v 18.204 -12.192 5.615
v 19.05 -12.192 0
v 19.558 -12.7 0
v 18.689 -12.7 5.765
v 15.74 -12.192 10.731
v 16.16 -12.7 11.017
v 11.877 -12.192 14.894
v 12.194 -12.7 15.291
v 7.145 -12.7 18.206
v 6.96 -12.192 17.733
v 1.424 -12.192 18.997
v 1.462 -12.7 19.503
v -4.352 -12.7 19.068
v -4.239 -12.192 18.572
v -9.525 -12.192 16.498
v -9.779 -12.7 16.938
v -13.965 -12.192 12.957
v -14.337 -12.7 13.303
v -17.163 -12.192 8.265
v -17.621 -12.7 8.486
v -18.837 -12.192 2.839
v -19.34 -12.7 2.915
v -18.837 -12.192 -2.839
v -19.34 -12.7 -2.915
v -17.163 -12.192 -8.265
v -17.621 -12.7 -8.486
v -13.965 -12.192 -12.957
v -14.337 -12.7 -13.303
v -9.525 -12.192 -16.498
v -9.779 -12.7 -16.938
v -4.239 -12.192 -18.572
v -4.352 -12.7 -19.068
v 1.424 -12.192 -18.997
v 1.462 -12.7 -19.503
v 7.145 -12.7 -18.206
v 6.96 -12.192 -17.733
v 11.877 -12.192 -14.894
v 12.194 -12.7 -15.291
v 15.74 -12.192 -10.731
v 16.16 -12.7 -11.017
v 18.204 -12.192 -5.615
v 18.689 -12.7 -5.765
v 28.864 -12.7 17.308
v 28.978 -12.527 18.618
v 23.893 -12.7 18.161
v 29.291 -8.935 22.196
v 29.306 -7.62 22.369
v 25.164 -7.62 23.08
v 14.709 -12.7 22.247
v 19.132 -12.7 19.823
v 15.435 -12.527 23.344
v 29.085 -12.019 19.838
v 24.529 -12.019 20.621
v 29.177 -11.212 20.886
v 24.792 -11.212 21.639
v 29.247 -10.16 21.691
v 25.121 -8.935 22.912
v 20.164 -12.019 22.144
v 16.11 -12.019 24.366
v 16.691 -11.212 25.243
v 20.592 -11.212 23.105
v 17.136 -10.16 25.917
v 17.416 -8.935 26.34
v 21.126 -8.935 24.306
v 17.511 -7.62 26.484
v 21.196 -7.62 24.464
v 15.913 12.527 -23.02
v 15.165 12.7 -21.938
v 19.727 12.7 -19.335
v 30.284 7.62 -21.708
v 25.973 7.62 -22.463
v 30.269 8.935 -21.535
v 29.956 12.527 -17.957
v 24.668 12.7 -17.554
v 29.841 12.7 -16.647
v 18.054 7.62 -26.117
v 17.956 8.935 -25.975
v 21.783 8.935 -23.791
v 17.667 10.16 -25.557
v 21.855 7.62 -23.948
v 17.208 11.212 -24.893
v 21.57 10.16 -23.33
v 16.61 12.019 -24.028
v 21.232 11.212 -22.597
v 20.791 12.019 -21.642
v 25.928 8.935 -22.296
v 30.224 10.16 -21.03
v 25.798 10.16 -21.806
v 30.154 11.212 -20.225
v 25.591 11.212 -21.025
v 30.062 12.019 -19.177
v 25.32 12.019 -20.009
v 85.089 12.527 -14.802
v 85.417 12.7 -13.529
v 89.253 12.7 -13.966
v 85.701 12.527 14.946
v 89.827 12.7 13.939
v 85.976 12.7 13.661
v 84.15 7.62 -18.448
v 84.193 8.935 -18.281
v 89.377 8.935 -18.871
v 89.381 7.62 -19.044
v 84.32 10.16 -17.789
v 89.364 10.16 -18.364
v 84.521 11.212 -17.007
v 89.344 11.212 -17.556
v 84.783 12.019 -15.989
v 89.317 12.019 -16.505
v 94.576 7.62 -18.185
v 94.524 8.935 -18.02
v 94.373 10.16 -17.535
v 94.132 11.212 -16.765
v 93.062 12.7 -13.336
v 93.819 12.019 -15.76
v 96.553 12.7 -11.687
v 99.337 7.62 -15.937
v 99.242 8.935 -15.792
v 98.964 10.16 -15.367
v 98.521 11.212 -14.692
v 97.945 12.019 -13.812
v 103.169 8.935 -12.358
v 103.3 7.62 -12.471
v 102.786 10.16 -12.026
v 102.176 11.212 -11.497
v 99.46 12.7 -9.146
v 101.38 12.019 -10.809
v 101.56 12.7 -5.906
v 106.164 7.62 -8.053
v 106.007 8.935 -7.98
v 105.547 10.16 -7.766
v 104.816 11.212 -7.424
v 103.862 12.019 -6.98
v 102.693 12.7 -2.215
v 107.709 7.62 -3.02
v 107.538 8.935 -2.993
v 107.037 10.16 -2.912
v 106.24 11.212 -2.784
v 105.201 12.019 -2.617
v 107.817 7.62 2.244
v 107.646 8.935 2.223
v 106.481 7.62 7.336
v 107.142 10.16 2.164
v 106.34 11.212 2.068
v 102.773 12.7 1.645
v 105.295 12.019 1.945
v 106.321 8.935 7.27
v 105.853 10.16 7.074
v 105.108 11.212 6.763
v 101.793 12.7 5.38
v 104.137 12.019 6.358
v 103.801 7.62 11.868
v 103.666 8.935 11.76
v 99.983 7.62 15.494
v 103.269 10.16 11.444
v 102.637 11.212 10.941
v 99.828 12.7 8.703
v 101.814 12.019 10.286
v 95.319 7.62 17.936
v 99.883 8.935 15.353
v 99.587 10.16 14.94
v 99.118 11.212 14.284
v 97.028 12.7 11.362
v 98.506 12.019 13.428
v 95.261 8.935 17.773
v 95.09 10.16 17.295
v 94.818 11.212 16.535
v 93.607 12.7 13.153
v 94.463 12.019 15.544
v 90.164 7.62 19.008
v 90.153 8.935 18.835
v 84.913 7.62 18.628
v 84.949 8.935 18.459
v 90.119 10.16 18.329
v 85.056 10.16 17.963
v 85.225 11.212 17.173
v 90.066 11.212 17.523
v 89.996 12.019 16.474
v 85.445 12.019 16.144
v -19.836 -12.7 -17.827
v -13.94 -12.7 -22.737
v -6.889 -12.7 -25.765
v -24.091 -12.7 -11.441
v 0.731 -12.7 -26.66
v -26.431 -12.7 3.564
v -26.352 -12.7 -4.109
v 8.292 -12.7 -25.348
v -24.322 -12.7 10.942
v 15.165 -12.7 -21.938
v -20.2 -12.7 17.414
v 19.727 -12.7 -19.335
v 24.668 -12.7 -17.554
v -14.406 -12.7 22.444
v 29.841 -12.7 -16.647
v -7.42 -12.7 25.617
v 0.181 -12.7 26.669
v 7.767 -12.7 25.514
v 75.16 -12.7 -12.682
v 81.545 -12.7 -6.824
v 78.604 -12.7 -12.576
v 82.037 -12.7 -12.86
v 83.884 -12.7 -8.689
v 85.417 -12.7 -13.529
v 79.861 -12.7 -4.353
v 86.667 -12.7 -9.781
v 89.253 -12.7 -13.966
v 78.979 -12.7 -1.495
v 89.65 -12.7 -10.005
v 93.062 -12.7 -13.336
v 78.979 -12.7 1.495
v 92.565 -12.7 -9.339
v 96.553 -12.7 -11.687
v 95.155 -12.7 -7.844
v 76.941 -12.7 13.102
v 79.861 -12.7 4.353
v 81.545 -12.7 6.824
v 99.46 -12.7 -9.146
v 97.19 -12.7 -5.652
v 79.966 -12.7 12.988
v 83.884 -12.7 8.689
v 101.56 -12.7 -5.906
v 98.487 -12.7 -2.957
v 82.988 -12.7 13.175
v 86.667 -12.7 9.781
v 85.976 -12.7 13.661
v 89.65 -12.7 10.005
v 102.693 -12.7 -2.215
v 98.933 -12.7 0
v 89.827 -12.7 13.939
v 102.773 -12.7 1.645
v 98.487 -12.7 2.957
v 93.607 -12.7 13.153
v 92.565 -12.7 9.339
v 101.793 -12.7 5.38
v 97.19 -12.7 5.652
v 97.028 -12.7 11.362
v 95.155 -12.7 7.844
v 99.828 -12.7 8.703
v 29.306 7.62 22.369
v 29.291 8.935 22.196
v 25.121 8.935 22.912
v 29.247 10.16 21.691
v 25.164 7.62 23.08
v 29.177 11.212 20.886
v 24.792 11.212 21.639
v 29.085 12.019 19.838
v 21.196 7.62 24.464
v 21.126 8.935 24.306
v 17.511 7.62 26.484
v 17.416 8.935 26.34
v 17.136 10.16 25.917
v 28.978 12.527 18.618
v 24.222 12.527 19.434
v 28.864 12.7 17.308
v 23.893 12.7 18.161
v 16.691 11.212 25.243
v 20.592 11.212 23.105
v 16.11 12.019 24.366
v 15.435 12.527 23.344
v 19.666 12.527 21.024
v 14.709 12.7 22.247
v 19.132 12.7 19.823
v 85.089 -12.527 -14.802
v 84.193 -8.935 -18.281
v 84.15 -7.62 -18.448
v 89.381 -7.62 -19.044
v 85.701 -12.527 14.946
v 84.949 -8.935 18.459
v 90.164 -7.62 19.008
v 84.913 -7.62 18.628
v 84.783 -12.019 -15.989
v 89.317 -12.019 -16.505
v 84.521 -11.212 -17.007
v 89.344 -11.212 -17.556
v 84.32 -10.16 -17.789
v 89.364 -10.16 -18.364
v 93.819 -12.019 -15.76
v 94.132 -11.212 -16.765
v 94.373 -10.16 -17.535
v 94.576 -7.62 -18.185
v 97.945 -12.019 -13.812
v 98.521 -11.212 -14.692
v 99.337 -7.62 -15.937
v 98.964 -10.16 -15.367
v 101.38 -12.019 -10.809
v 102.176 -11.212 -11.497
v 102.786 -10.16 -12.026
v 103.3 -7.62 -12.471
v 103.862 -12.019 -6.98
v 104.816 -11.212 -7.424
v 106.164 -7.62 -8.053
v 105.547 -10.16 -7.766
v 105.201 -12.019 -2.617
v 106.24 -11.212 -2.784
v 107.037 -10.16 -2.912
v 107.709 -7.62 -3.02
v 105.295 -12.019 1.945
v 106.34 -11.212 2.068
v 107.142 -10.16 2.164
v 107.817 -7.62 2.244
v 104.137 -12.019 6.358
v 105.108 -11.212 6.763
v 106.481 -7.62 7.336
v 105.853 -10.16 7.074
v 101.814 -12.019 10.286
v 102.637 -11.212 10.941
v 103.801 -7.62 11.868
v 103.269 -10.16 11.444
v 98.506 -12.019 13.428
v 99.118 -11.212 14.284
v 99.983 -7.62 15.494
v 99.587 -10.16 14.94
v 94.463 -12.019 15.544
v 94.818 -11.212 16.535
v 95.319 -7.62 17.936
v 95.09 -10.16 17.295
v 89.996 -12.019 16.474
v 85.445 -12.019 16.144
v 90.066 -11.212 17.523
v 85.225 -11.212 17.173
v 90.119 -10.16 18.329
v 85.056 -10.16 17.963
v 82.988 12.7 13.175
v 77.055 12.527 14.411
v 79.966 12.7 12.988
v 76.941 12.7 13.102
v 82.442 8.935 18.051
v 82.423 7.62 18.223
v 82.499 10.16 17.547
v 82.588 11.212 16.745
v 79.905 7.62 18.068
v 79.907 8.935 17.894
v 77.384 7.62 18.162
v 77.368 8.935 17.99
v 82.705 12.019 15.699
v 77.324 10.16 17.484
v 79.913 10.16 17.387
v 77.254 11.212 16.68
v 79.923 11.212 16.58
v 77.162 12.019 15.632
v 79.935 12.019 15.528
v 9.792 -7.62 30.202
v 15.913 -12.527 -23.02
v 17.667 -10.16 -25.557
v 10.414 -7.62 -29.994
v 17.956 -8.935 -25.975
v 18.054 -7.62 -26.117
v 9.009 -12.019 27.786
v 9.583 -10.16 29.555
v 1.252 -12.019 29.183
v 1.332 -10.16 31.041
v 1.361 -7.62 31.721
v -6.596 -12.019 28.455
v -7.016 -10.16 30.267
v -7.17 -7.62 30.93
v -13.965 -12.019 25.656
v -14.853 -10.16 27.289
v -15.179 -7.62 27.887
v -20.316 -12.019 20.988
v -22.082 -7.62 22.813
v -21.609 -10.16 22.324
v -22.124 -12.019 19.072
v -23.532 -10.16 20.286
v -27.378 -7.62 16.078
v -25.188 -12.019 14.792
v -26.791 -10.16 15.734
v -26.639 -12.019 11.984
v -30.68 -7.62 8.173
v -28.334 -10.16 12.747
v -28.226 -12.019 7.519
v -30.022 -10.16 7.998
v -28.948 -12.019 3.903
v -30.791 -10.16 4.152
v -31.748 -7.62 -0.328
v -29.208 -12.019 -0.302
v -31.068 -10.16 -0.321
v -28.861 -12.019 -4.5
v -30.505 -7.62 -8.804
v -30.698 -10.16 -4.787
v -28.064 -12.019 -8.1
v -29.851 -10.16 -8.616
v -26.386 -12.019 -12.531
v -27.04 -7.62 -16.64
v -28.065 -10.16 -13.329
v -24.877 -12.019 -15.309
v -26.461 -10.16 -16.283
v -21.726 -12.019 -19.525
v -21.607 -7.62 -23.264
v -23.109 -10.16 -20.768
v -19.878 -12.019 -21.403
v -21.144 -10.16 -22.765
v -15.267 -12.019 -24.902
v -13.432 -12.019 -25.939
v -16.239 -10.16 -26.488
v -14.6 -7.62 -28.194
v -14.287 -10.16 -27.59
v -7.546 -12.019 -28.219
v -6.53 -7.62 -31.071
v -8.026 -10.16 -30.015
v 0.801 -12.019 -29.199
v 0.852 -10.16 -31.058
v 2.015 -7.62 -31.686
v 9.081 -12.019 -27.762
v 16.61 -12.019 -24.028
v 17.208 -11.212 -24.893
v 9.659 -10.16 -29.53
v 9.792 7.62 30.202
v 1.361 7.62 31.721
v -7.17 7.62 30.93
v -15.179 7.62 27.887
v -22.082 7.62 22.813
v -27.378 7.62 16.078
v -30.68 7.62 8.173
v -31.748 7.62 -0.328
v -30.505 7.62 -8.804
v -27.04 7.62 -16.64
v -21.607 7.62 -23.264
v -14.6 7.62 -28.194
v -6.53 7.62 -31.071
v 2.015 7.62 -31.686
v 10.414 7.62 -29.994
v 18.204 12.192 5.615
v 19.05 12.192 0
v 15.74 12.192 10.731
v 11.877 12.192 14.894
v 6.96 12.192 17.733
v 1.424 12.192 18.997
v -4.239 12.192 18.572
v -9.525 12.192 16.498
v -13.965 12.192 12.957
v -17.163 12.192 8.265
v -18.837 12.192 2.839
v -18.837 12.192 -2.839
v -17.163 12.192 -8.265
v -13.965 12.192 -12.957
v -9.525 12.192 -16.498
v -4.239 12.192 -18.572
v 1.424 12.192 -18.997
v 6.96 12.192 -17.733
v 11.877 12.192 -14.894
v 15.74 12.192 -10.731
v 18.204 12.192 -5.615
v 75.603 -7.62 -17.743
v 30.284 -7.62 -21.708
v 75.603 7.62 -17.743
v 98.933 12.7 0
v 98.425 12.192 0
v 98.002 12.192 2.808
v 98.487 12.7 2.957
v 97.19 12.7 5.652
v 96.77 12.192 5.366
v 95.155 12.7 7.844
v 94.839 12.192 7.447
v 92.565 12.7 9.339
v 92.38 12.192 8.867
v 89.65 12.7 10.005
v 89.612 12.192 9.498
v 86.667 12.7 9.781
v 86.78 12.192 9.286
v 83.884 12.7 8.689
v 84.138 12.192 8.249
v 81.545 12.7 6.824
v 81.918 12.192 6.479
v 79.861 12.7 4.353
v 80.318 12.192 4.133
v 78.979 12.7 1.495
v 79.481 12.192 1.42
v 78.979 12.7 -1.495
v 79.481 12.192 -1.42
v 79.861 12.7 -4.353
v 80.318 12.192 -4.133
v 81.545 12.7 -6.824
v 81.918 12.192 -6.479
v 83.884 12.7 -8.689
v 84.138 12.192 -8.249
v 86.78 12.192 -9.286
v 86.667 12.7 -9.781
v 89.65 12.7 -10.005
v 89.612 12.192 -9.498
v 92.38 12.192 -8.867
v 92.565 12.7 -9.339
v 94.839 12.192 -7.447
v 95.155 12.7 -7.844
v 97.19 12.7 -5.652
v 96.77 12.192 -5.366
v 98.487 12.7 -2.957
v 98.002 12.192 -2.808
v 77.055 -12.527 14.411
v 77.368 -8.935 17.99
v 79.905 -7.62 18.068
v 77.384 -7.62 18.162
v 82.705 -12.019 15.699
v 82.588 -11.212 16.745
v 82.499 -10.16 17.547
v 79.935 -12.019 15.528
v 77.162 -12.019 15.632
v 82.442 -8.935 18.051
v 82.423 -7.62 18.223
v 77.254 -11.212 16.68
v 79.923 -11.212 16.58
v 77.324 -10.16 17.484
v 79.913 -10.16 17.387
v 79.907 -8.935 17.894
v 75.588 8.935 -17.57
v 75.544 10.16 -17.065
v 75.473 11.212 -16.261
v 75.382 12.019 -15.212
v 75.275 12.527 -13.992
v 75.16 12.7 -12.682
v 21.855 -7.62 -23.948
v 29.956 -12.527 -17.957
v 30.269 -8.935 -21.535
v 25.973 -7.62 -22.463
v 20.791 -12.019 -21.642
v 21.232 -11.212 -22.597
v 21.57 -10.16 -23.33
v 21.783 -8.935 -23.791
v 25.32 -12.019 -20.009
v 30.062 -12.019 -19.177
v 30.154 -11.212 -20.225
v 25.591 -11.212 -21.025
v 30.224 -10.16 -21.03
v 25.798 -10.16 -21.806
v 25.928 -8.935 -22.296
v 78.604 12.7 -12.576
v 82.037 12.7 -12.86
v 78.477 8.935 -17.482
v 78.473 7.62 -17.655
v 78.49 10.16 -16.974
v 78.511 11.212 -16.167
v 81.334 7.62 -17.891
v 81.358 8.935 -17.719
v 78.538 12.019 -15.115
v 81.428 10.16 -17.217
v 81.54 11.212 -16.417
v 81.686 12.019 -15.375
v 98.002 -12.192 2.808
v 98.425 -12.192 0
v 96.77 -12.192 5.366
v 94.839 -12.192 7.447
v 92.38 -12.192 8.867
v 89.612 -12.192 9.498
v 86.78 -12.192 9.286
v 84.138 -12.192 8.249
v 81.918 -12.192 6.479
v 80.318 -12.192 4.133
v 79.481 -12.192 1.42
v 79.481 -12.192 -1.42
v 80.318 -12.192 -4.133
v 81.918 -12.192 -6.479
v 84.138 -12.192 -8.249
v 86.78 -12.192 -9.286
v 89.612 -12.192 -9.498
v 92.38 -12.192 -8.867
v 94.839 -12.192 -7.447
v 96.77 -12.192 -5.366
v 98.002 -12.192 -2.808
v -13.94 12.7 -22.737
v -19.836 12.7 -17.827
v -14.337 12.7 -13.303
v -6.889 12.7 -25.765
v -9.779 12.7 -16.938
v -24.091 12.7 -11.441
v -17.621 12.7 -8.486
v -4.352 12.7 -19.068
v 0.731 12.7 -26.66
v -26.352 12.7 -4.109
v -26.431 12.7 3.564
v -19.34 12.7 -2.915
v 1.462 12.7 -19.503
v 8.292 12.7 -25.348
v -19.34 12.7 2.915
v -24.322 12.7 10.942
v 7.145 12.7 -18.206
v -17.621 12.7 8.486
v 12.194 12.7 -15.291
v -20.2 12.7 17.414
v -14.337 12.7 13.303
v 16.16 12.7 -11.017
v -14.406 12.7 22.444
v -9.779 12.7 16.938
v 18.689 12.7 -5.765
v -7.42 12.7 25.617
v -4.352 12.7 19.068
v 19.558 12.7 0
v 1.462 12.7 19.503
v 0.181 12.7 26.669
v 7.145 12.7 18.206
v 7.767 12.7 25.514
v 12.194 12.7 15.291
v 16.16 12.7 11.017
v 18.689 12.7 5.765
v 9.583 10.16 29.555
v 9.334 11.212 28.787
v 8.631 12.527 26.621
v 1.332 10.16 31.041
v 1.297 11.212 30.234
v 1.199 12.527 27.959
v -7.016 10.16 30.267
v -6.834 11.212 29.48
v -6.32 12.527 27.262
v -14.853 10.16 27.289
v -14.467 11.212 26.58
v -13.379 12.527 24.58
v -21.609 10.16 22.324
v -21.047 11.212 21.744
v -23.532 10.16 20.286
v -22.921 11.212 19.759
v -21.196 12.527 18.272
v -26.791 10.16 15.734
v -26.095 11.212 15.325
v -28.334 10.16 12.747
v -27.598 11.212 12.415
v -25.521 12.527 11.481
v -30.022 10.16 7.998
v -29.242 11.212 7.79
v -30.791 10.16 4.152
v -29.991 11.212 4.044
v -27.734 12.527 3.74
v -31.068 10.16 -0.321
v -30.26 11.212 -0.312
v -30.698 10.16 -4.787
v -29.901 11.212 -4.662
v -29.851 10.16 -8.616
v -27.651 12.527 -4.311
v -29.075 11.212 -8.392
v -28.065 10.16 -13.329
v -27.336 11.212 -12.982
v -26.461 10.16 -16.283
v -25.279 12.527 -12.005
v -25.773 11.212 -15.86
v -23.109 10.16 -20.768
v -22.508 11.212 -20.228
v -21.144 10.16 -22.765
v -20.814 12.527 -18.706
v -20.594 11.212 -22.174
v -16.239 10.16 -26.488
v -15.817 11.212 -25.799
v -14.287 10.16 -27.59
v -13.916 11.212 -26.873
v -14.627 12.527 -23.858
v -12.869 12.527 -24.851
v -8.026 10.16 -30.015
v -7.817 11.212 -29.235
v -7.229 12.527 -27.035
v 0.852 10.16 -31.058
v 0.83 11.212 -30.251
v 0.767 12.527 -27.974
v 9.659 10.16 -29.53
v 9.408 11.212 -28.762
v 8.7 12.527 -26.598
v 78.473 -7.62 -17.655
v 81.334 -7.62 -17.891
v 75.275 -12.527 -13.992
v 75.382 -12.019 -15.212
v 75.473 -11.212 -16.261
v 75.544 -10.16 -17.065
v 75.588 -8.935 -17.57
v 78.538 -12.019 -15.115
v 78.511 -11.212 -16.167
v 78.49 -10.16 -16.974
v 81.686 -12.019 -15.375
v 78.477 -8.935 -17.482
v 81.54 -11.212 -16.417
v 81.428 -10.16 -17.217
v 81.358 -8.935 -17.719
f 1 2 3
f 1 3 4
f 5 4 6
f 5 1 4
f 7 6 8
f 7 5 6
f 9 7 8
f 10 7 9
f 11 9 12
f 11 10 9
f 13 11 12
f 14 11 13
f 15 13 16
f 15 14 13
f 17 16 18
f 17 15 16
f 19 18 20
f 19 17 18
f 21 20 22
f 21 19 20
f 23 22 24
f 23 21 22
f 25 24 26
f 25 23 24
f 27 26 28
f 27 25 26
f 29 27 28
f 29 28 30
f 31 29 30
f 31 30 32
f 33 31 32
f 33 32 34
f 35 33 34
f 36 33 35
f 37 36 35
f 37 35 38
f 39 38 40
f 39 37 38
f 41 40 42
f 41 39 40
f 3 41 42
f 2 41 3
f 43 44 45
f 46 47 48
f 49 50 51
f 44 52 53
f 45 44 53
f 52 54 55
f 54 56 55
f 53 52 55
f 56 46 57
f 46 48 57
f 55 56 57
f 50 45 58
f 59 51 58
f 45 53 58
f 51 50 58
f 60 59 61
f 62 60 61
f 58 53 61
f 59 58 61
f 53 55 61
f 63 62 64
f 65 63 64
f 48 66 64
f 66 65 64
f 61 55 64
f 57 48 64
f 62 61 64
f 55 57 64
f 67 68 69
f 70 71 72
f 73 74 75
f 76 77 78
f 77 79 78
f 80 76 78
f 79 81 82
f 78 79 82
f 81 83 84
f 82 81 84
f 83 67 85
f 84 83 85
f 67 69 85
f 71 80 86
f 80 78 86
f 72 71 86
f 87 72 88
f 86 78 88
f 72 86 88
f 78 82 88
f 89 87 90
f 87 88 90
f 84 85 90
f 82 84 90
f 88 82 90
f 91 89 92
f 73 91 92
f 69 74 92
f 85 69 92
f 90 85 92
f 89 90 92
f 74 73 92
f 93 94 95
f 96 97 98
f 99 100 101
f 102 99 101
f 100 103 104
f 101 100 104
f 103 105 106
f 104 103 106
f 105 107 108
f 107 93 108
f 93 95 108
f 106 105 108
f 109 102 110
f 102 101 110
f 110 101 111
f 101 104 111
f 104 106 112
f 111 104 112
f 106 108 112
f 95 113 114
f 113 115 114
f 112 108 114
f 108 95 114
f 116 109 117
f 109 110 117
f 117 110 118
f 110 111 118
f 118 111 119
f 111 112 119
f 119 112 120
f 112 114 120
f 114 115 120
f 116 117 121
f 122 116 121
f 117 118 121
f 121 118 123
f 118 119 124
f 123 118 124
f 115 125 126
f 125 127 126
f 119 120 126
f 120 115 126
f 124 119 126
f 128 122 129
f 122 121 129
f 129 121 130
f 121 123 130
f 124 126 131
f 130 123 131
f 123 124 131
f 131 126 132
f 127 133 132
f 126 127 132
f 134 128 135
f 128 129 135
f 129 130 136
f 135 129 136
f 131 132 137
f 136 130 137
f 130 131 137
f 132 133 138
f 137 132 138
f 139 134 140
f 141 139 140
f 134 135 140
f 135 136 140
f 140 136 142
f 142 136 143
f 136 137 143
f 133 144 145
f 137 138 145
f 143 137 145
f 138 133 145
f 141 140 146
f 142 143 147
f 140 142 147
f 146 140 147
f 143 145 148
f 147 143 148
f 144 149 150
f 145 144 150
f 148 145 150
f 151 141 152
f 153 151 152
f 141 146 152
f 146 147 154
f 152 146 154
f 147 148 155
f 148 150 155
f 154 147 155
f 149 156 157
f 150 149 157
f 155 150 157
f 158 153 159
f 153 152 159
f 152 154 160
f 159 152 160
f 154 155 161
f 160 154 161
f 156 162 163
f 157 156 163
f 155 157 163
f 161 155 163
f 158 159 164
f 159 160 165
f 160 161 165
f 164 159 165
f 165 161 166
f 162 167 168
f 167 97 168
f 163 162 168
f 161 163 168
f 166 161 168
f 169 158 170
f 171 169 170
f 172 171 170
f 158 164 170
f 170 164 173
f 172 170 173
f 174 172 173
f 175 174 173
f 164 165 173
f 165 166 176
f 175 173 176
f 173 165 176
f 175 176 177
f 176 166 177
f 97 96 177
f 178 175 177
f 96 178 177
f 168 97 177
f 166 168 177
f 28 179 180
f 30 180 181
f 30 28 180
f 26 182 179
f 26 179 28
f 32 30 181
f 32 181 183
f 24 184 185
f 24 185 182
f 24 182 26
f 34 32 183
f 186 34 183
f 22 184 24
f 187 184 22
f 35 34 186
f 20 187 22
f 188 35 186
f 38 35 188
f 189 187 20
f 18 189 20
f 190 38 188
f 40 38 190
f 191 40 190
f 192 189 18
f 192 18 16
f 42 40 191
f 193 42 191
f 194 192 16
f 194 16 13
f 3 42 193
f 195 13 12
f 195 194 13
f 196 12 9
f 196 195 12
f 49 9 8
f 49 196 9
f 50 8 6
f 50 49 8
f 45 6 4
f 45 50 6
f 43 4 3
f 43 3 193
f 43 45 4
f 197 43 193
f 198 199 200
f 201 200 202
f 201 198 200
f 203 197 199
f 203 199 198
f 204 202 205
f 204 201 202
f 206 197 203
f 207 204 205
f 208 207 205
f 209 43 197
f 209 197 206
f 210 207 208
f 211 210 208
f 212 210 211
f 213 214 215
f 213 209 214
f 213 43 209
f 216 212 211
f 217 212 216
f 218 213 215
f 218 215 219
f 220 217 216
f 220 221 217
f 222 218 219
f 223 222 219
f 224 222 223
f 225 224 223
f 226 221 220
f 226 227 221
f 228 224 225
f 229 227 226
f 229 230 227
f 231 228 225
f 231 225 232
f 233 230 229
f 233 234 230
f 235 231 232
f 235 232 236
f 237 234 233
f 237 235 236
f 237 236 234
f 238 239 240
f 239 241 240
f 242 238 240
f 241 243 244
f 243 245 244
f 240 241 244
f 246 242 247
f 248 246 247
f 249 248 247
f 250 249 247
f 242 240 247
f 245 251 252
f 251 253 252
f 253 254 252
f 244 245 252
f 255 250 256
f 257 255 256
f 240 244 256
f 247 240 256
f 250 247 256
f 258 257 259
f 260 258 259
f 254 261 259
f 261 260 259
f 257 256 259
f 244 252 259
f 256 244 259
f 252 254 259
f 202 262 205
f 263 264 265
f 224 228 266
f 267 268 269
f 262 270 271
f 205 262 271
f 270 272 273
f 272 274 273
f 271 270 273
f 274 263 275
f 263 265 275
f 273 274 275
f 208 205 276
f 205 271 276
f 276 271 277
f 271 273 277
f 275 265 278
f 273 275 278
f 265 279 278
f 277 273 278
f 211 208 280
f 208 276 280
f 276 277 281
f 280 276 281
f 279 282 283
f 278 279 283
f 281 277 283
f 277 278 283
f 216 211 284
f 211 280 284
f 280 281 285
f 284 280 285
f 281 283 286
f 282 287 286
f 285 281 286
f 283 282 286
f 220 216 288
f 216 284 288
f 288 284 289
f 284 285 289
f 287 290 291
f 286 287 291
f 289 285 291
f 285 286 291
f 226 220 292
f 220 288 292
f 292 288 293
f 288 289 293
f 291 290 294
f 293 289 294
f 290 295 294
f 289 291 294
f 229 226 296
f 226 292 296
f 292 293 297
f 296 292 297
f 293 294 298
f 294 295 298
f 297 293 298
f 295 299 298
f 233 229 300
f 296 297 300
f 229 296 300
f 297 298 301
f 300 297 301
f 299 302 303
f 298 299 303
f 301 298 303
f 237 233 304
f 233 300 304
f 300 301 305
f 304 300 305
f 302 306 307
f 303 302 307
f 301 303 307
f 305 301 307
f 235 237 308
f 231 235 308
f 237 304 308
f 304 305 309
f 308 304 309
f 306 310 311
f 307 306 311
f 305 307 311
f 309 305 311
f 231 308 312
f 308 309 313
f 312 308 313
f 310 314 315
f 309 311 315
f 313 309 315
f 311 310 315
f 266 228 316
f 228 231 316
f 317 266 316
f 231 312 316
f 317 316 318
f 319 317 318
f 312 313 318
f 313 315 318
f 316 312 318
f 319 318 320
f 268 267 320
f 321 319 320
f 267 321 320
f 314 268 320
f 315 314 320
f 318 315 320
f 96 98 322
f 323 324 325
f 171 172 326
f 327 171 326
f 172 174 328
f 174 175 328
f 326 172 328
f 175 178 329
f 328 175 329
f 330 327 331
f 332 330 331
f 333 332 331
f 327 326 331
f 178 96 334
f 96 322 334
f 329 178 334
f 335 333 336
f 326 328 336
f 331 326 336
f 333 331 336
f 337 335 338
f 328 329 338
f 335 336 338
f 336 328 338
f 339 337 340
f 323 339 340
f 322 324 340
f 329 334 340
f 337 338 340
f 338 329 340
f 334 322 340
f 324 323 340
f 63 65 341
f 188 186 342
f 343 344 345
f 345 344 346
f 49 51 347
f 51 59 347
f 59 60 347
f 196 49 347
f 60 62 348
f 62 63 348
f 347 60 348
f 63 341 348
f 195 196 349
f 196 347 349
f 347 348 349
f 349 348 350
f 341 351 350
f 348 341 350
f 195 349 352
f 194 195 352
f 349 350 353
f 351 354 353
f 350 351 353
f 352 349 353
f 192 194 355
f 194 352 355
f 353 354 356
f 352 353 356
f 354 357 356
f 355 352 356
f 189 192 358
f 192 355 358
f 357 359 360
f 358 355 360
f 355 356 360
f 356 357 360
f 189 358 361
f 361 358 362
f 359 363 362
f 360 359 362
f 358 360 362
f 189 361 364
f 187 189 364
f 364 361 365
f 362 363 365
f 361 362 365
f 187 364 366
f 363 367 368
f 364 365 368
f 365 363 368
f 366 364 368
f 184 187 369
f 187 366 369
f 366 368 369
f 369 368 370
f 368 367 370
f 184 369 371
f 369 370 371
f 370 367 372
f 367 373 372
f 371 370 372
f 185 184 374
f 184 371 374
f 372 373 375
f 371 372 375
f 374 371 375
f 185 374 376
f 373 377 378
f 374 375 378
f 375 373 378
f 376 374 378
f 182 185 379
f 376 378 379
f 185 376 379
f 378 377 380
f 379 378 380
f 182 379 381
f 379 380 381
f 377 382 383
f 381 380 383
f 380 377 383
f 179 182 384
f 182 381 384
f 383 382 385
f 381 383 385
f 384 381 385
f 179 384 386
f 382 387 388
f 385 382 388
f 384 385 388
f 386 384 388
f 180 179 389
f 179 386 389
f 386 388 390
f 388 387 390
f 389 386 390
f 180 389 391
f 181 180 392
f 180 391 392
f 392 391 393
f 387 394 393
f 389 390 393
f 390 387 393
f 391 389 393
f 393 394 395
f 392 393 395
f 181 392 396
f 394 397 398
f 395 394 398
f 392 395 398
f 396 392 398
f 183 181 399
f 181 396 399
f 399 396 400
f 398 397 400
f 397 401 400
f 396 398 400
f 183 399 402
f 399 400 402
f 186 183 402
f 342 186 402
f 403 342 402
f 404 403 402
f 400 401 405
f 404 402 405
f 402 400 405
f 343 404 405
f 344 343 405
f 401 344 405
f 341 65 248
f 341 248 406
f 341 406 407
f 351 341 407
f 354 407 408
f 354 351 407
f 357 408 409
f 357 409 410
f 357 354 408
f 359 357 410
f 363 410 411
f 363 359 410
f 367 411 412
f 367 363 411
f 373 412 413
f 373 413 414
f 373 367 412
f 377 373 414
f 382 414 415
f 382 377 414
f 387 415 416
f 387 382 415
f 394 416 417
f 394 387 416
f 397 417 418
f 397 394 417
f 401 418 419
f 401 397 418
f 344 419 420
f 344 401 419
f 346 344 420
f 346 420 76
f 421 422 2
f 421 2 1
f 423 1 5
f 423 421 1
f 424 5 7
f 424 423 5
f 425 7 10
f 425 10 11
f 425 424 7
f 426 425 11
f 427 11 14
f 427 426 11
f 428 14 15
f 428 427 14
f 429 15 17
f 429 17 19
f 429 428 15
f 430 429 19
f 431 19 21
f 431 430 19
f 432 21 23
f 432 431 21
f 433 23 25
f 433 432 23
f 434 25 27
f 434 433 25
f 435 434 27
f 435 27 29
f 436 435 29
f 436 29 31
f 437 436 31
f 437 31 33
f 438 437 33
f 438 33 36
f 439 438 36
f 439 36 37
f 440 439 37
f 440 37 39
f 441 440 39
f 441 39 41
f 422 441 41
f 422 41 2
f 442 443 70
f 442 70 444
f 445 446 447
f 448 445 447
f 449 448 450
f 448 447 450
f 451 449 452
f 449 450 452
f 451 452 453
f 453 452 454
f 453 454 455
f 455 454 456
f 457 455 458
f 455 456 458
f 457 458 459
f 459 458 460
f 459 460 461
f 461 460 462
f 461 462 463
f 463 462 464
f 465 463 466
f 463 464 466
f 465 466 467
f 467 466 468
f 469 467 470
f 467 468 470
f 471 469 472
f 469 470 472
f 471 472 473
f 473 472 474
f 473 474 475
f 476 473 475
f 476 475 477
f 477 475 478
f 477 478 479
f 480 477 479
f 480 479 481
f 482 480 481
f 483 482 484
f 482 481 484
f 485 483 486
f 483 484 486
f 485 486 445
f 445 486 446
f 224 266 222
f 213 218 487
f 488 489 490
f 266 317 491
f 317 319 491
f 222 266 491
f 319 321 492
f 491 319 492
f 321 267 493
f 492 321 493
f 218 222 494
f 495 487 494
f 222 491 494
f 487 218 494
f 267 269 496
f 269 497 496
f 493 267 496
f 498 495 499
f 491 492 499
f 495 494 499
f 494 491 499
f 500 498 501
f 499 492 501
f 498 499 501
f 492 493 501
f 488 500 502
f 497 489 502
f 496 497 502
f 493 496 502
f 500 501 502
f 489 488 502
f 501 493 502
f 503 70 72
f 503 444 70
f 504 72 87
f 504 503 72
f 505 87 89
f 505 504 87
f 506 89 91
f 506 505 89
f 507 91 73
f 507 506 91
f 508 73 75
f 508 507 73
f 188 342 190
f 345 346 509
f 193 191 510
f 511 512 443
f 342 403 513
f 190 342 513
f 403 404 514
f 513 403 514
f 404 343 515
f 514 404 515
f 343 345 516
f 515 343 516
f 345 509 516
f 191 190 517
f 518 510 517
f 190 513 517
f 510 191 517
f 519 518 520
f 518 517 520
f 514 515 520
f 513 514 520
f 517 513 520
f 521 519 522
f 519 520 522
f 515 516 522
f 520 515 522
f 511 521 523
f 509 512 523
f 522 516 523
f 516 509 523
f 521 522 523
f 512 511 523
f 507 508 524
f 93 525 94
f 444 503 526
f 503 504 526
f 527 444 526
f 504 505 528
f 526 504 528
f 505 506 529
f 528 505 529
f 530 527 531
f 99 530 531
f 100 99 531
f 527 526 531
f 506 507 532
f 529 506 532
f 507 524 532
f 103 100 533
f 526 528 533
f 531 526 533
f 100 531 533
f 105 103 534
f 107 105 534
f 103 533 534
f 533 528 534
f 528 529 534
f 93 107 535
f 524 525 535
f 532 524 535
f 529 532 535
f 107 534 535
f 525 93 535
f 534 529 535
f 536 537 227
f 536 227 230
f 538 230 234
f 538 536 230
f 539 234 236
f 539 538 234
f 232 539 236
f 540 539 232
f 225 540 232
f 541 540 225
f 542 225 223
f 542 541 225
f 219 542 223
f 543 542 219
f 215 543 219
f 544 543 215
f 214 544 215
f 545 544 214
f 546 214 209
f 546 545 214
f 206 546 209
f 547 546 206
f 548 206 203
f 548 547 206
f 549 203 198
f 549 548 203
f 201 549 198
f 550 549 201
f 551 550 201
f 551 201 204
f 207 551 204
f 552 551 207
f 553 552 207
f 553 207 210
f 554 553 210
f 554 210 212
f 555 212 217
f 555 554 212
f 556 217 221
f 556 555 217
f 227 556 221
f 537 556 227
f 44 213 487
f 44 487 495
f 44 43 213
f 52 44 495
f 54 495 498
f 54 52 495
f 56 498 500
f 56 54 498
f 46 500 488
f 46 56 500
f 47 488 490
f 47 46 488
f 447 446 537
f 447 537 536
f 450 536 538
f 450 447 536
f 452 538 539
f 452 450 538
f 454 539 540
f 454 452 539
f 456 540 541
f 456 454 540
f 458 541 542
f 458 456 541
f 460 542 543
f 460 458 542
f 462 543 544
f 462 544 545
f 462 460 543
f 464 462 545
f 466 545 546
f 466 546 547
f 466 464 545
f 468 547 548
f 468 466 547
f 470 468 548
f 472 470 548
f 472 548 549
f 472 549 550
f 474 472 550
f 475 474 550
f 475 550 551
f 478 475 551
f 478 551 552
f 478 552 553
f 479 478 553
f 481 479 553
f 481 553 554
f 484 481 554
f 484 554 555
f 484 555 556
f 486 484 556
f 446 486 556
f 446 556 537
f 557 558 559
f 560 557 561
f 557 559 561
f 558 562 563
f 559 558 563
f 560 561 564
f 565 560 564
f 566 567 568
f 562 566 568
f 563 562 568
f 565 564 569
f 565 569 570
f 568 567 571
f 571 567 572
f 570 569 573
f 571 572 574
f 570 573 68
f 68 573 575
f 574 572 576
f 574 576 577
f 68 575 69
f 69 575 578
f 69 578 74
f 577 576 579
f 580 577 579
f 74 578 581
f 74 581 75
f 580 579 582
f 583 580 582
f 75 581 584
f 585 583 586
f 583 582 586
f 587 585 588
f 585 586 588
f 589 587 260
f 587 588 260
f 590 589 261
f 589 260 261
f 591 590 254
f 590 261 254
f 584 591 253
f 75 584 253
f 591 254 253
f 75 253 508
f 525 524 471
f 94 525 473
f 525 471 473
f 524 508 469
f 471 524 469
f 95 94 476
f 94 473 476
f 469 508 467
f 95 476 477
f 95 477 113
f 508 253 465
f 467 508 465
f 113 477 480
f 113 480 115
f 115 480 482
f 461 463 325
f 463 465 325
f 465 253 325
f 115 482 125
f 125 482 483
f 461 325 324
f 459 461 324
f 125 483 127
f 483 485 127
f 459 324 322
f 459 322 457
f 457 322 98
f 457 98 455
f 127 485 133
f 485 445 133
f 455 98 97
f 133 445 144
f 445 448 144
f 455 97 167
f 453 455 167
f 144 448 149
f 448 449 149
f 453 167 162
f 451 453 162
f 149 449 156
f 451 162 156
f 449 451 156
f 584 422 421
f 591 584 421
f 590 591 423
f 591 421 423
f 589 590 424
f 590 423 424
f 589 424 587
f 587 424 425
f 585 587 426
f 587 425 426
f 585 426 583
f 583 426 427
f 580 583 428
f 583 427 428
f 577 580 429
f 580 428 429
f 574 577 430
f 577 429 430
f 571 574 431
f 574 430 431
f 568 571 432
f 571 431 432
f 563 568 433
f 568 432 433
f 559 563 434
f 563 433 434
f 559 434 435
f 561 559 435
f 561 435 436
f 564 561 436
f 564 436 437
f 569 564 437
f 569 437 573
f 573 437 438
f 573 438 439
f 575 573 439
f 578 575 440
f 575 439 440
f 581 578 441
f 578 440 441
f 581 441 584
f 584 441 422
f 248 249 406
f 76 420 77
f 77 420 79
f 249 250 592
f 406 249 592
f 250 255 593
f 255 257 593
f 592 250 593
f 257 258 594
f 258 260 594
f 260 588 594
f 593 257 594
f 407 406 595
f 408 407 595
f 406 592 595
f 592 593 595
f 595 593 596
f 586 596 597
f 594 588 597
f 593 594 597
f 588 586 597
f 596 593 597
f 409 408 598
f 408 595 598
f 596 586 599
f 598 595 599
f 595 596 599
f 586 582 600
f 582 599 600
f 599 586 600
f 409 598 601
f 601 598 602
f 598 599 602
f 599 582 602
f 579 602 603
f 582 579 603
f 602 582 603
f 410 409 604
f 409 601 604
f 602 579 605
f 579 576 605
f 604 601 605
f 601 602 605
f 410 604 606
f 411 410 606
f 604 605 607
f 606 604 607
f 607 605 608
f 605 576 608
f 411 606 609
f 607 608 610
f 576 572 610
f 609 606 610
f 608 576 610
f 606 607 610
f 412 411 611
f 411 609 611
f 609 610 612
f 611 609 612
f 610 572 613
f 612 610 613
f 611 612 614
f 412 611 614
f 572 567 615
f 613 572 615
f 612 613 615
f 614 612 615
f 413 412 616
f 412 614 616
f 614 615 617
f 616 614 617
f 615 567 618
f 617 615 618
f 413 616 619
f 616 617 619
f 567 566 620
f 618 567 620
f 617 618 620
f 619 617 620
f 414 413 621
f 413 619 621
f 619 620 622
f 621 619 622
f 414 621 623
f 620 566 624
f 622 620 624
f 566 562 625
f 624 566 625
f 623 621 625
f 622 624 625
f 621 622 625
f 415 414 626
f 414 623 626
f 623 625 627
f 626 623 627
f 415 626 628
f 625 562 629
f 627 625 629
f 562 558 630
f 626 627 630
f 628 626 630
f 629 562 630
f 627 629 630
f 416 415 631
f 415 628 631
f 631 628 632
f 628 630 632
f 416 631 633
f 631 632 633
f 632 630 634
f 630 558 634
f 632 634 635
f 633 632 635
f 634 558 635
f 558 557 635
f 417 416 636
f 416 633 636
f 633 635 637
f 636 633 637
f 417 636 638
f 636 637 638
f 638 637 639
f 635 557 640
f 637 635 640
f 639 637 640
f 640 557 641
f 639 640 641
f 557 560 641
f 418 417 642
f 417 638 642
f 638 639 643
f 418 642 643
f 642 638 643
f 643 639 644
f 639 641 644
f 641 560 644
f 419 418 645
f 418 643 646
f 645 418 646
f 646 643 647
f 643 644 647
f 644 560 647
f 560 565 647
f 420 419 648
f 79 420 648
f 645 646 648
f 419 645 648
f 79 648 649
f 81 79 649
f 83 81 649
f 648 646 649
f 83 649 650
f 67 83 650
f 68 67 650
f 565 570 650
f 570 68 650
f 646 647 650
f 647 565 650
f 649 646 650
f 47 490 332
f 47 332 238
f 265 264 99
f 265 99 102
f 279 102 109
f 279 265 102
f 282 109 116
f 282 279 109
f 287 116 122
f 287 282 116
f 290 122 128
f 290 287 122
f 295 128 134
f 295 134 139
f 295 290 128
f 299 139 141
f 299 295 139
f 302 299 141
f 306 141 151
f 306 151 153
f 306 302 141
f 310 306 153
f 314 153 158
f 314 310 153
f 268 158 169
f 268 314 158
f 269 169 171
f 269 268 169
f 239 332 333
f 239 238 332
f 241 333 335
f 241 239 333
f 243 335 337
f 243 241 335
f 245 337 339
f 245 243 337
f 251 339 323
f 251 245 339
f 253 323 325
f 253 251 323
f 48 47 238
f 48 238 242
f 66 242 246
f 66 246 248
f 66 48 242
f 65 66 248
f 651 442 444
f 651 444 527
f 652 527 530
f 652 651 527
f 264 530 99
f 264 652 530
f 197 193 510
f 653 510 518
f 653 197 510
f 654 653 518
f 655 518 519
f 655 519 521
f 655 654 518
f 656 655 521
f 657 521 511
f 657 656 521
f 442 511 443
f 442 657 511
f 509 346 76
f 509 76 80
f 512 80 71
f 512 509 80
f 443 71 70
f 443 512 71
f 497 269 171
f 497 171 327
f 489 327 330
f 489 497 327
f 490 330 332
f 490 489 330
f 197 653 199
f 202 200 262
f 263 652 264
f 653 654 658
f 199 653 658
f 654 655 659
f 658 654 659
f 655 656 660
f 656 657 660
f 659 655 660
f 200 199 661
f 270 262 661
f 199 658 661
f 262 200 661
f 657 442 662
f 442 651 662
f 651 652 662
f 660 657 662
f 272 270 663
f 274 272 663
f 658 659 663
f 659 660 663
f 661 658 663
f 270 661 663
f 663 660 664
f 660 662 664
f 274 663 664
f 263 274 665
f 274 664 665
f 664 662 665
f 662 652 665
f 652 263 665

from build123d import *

# Parameters (mm, degrees)
F0_R     = 19.05
F0_R_2   = 9.525
F1_DEPTH = 12.7
F2_R     = 5.08
F3_SIZE  = 0.508


with BuildPart() as f1:
    # F0 (on Front) → F1 (new body, symmetric)
    with BuildSketch(Plane.XZ):
        with BuildLine():
            ThreePointArc((29.306325, 22.368523), (23.151754, 23.689977), (17.511156, 26.484371))
            ThreePointArc((17.511156, 26.484371), (-31.748308, -0.327731), (18.054151, -26.117238))
            ThreePointArc((18.054151, -26.117238), (23.882044, -23.116795), (30.283716, -21.707683))
            Line((30.283716, -21.707683), (75.603099, -17.742751))
            ThreePointArc((75.603099, -17.742751), (79.906584, -17.732206), (84.150081, -18.448327))
            ThreePointArc((84.150081, -18.448327), (107.945967, -0.391982), (84.913145, 18.628137))
            ThreePointArc((84.913145, 18.628137), (81.165755, 18.114123), (77.383583, 18.162308))
            Line((77.383583, 18.162308), (29.306325, 22.368523))
        make_face()
        Circle(F0_R, mode=Mode.SUBTRACT)
        with Locations((88.9, 0)):
            Circle(F0_R_2, mode=Mode.SUBTRACT)
    extrude(amount=F1_DEPTH, both=True)

    # F2
    f2_edges = [f1.edges().sort_by_distance(p)[0] for p in [
        (-31.748308, -12.7, -0.327731),
        (-31.748308, 12.7, -0.327731),
    ]]
    fillet(f2_edges, radius=F2_R)

    # F3
    f3_edges = [f1.edges().sort_by_distance(p)[0] for p in [
        (-19.05, -12.7, 0),
        (79.375, -12.7, 0),
        (-19.05, 12.7, 0),
        (79.375, 12.7, 0),
    ]]
    chamfer(f3_edges, length=F3_SIZE)


solid = f1.part
